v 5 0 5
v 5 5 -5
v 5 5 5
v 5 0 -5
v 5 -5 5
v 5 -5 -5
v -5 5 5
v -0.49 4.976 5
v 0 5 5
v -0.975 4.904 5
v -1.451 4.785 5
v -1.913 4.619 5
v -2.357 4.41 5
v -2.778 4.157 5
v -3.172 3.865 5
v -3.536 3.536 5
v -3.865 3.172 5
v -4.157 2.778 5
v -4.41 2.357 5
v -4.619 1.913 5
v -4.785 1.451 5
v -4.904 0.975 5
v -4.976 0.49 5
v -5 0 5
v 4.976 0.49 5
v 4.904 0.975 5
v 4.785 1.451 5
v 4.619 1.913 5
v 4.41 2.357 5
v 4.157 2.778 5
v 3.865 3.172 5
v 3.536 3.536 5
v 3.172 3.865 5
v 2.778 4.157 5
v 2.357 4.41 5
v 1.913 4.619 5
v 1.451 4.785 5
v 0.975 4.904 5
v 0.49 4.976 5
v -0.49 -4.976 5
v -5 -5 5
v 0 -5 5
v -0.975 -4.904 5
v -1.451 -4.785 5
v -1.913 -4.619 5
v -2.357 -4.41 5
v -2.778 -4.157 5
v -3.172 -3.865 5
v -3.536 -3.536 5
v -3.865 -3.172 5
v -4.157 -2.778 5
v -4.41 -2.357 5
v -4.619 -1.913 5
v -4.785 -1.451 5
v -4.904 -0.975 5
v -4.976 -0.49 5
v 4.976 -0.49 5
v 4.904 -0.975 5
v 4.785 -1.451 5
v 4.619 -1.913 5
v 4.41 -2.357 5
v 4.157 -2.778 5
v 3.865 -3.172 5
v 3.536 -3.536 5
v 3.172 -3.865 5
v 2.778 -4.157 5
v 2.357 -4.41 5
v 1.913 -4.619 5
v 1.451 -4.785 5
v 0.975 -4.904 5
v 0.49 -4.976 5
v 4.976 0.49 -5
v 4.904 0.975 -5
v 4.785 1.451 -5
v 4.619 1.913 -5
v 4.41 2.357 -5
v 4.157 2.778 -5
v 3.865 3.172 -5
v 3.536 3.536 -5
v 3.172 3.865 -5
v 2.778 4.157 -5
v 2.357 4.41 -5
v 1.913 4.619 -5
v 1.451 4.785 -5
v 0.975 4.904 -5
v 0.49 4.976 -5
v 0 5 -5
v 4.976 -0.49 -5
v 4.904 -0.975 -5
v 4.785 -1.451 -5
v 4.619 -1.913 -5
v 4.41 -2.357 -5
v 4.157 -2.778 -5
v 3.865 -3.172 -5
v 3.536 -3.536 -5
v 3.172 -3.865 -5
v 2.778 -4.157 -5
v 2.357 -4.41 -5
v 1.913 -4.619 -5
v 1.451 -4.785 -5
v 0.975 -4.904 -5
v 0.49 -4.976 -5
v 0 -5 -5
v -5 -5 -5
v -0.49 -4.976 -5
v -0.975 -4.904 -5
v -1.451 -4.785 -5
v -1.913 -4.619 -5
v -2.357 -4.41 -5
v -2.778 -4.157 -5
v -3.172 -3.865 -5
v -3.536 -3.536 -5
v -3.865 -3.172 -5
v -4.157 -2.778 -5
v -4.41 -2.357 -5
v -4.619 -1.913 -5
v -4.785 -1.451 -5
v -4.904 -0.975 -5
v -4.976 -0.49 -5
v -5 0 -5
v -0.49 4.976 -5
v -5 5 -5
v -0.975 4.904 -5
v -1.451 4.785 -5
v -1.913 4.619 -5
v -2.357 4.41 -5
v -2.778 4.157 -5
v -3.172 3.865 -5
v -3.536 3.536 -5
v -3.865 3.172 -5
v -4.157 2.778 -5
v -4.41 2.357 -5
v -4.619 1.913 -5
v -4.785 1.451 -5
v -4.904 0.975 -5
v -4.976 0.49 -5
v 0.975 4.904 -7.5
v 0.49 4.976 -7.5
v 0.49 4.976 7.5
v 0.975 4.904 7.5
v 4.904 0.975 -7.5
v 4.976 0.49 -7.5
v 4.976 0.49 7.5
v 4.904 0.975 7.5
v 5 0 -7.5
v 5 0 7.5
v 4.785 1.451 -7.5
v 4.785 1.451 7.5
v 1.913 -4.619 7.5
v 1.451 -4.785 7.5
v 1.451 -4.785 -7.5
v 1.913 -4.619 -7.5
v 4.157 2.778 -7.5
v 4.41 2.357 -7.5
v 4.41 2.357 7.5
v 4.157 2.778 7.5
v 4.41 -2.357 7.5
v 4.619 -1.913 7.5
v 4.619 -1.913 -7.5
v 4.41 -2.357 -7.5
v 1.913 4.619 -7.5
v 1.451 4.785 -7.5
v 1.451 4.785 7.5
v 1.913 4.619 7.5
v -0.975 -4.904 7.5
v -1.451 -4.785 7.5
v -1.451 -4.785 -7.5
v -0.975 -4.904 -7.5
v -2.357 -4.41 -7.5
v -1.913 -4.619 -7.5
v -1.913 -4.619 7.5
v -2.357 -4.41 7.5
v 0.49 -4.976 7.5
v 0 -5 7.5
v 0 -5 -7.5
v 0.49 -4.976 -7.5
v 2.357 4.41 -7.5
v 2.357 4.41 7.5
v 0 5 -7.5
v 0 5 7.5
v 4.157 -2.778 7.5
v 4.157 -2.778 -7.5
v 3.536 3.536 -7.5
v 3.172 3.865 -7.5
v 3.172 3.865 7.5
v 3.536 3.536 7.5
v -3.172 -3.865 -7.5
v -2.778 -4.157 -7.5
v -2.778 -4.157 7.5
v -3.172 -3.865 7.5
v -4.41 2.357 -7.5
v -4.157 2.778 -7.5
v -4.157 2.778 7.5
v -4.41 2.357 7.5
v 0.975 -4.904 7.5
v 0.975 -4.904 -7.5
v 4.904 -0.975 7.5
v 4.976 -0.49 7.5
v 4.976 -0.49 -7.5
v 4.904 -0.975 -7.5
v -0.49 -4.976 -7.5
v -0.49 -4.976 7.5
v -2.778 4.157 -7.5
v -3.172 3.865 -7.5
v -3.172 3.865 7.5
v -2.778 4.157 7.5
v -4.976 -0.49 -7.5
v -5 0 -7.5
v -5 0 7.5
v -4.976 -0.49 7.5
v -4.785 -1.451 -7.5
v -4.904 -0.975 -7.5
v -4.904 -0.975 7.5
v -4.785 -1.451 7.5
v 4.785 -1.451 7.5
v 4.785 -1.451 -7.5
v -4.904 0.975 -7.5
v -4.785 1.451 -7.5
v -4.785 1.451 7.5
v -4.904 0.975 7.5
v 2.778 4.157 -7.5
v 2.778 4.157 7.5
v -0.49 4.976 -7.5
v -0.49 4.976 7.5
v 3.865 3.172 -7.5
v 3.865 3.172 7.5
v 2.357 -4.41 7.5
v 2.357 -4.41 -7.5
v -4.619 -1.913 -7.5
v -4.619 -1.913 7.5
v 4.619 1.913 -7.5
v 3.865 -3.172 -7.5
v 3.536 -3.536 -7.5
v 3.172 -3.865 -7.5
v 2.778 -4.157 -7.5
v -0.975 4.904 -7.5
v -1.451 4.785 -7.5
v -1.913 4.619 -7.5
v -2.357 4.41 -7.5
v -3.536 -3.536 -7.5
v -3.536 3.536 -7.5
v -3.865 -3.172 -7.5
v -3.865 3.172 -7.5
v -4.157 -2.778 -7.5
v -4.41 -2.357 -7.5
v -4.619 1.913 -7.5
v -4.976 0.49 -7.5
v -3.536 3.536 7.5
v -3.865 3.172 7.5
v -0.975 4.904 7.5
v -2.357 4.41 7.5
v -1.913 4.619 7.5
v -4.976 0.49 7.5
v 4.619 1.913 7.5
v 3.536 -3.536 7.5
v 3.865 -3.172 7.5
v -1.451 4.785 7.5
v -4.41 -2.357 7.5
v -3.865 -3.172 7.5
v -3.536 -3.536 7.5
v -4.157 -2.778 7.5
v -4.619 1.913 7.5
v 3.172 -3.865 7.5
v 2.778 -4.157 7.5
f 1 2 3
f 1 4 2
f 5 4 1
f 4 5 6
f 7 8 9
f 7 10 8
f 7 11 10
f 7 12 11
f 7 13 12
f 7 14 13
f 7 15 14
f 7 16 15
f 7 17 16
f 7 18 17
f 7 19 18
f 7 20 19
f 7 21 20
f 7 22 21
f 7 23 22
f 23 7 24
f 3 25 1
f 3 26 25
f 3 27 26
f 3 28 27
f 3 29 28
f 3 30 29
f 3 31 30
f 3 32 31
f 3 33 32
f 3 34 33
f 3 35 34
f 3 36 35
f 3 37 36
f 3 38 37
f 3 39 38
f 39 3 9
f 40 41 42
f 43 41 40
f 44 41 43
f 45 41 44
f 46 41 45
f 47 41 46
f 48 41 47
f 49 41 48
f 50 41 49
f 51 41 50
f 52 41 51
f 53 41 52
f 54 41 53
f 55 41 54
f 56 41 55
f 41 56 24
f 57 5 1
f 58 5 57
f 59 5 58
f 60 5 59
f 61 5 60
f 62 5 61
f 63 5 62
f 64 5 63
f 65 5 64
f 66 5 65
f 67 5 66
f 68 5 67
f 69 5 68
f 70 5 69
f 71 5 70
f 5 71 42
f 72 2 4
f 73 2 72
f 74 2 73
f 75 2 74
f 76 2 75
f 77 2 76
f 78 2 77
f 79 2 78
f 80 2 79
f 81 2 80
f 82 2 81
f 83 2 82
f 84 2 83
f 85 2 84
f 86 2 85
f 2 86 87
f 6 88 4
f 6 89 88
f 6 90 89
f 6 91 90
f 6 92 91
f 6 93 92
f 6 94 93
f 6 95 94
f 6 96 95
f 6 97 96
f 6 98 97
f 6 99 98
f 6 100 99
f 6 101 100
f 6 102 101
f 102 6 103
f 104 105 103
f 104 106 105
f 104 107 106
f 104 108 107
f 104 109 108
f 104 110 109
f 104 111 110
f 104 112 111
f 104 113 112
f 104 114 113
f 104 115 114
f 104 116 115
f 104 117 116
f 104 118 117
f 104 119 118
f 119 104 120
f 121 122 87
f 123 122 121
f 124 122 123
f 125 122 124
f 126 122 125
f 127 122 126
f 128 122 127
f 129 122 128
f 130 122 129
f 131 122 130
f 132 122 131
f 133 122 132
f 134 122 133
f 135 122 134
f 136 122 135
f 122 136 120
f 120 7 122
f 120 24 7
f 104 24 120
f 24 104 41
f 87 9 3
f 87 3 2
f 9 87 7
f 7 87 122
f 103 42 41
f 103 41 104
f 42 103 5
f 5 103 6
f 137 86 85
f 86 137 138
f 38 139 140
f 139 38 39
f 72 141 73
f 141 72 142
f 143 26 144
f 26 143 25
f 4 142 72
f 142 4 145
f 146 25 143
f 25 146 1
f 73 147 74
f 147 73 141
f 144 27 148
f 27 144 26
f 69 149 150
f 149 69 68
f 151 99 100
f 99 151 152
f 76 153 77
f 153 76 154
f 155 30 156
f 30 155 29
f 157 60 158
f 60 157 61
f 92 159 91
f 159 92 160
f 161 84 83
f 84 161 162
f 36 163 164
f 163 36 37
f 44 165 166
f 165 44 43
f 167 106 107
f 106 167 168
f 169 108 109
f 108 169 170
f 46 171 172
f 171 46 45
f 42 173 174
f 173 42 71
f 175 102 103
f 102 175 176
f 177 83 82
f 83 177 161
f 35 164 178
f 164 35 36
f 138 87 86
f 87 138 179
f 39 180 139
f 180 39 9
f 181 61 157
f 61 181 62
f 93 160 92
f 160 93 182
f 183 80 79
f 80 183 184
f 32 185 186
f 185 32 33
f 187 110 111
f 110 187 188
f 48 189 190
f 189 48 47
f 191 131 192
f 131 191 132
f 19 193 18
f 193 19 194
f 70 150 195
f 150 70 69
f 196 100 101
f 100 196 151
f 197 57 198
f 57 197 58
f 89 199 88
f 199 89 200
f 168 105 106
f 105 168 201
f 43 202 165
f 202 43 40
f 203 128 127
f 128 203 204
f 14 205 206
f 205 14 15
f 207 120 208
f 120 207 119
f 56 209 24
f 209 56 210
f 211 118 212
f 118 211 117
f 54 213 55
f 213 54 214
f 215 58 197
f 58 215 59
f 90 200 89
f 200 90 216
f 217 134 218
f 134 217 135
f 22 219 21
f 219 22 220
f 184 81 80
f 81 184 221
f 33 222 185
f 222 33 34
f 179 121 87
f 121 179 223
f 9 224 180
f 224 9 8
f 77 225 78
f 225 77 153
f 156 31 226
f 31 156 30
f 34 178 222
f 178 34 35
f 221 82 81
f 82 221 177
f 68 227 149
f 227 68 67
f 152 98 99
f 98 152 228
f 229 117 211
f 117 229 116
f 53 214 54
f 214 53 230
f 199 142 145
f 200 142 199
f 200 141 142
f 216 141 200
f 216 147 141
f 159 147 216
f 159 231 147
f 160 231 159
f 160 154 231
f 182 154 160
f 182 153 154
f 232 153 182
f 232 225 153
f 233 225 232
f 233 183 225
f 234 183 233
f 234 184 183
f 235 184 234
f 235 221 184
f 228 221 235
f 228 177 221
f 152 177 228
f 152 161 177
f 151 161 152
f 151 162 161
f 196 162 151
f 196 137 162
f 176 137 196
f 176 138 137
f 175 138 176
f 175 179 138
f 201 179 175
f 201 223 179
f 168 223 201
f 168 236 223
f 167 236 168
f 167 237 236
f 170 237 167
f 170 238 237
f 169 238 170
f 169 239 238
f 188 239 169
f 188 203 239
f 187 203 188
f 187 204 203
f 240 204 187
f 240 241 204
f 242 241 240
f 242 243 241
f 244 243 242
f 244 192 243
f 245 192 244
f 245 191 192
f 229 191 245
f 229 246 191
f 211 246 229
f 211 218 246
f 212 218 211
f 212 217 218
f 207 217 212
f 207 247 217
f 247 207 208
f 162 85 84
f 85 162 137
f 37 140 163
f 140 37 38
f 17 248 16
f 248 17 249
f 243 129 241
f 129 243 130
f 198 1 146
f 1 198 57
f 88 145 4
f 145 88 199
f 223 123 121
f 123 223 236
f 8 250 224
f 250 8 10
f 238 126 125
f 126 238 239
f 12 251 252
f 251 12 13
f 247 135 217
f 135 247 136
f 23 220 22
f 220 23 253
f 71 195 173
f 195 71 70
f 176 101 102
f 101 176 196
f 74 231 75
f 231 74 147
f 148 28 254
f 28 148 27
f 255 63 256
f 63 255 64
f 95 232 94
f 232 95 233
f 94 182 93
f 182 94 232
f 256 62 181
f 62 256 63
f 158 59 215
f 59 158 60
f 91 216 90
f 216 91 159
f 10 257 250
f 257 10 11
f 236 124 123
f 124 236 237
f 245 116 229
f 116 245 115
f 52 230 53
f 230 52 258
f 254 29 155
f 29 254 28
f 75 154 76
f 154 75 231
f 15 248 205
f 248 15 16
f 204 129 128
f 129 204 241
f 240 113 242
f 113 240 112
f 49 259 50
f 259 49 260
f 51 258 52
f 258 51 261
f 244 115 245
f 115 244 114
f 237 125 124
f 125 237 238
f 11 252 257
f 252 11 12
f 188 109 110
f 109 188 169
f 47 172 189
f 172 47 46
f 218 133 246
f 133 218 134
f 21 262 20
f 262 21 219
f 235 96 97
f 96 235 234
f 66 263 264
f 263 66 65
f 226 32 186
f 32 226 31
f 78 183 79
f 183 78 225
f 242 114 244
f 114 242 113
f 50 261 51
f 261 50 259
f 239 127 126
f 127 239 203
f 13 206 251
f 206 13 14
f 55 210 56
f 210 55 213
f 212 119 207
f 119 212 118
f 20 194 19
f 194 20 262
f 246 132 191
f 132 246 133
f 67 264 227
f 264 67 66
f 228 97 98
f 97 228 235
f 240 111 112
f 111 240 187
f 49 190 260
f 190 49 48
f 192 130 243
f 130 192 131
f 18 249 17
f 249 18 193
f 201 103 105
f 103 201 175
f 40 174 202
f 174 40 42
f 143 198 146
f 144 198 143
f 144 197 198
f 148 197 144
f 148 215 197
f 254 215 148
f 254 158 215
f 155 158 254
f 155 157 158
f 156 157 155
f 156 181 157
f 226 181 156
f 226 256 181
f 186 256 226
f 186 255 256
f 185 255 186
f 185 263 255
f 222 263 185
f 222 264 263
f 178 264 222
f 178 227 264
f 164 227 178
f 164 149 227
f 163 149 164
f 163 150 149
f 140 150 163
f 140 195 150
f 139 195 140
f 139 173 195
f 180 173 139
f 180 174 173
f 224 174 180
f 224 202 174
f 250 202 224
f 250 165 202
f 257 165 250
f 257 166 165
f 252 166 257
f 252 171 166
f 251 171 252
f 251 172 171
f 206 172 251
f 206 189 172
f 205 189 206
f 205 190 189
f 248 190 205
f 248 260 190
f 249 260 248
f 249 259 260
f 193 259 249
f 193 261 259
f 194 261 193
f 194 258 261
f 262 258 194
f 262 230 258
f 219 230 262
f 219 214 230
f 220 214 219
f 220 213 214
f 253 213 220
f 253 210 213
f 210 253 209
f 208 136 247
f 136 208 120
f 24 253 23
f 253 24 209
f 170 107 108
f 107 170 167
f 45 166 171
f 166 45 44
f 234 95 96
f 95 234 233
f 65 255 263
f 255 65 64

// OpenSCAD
// Set fragment number for roundings
$fn = $preview ? 32 : 64;

// Size of the cube (all directions)
cubSiz = 10;

//Diameter of the Cylinder
cyDia = 10;

//Height of the Cylinder
cyHei = 15;

// Create a union from a Cube and Cylinder
// Seems to be superfluous
// You will learn later why it's needed
union(){
    cube(size = [cubSiz, cubSiz, cubSiz], center = true);
    cylinder(d = cyDia, h = cyHei, center = true);
}
